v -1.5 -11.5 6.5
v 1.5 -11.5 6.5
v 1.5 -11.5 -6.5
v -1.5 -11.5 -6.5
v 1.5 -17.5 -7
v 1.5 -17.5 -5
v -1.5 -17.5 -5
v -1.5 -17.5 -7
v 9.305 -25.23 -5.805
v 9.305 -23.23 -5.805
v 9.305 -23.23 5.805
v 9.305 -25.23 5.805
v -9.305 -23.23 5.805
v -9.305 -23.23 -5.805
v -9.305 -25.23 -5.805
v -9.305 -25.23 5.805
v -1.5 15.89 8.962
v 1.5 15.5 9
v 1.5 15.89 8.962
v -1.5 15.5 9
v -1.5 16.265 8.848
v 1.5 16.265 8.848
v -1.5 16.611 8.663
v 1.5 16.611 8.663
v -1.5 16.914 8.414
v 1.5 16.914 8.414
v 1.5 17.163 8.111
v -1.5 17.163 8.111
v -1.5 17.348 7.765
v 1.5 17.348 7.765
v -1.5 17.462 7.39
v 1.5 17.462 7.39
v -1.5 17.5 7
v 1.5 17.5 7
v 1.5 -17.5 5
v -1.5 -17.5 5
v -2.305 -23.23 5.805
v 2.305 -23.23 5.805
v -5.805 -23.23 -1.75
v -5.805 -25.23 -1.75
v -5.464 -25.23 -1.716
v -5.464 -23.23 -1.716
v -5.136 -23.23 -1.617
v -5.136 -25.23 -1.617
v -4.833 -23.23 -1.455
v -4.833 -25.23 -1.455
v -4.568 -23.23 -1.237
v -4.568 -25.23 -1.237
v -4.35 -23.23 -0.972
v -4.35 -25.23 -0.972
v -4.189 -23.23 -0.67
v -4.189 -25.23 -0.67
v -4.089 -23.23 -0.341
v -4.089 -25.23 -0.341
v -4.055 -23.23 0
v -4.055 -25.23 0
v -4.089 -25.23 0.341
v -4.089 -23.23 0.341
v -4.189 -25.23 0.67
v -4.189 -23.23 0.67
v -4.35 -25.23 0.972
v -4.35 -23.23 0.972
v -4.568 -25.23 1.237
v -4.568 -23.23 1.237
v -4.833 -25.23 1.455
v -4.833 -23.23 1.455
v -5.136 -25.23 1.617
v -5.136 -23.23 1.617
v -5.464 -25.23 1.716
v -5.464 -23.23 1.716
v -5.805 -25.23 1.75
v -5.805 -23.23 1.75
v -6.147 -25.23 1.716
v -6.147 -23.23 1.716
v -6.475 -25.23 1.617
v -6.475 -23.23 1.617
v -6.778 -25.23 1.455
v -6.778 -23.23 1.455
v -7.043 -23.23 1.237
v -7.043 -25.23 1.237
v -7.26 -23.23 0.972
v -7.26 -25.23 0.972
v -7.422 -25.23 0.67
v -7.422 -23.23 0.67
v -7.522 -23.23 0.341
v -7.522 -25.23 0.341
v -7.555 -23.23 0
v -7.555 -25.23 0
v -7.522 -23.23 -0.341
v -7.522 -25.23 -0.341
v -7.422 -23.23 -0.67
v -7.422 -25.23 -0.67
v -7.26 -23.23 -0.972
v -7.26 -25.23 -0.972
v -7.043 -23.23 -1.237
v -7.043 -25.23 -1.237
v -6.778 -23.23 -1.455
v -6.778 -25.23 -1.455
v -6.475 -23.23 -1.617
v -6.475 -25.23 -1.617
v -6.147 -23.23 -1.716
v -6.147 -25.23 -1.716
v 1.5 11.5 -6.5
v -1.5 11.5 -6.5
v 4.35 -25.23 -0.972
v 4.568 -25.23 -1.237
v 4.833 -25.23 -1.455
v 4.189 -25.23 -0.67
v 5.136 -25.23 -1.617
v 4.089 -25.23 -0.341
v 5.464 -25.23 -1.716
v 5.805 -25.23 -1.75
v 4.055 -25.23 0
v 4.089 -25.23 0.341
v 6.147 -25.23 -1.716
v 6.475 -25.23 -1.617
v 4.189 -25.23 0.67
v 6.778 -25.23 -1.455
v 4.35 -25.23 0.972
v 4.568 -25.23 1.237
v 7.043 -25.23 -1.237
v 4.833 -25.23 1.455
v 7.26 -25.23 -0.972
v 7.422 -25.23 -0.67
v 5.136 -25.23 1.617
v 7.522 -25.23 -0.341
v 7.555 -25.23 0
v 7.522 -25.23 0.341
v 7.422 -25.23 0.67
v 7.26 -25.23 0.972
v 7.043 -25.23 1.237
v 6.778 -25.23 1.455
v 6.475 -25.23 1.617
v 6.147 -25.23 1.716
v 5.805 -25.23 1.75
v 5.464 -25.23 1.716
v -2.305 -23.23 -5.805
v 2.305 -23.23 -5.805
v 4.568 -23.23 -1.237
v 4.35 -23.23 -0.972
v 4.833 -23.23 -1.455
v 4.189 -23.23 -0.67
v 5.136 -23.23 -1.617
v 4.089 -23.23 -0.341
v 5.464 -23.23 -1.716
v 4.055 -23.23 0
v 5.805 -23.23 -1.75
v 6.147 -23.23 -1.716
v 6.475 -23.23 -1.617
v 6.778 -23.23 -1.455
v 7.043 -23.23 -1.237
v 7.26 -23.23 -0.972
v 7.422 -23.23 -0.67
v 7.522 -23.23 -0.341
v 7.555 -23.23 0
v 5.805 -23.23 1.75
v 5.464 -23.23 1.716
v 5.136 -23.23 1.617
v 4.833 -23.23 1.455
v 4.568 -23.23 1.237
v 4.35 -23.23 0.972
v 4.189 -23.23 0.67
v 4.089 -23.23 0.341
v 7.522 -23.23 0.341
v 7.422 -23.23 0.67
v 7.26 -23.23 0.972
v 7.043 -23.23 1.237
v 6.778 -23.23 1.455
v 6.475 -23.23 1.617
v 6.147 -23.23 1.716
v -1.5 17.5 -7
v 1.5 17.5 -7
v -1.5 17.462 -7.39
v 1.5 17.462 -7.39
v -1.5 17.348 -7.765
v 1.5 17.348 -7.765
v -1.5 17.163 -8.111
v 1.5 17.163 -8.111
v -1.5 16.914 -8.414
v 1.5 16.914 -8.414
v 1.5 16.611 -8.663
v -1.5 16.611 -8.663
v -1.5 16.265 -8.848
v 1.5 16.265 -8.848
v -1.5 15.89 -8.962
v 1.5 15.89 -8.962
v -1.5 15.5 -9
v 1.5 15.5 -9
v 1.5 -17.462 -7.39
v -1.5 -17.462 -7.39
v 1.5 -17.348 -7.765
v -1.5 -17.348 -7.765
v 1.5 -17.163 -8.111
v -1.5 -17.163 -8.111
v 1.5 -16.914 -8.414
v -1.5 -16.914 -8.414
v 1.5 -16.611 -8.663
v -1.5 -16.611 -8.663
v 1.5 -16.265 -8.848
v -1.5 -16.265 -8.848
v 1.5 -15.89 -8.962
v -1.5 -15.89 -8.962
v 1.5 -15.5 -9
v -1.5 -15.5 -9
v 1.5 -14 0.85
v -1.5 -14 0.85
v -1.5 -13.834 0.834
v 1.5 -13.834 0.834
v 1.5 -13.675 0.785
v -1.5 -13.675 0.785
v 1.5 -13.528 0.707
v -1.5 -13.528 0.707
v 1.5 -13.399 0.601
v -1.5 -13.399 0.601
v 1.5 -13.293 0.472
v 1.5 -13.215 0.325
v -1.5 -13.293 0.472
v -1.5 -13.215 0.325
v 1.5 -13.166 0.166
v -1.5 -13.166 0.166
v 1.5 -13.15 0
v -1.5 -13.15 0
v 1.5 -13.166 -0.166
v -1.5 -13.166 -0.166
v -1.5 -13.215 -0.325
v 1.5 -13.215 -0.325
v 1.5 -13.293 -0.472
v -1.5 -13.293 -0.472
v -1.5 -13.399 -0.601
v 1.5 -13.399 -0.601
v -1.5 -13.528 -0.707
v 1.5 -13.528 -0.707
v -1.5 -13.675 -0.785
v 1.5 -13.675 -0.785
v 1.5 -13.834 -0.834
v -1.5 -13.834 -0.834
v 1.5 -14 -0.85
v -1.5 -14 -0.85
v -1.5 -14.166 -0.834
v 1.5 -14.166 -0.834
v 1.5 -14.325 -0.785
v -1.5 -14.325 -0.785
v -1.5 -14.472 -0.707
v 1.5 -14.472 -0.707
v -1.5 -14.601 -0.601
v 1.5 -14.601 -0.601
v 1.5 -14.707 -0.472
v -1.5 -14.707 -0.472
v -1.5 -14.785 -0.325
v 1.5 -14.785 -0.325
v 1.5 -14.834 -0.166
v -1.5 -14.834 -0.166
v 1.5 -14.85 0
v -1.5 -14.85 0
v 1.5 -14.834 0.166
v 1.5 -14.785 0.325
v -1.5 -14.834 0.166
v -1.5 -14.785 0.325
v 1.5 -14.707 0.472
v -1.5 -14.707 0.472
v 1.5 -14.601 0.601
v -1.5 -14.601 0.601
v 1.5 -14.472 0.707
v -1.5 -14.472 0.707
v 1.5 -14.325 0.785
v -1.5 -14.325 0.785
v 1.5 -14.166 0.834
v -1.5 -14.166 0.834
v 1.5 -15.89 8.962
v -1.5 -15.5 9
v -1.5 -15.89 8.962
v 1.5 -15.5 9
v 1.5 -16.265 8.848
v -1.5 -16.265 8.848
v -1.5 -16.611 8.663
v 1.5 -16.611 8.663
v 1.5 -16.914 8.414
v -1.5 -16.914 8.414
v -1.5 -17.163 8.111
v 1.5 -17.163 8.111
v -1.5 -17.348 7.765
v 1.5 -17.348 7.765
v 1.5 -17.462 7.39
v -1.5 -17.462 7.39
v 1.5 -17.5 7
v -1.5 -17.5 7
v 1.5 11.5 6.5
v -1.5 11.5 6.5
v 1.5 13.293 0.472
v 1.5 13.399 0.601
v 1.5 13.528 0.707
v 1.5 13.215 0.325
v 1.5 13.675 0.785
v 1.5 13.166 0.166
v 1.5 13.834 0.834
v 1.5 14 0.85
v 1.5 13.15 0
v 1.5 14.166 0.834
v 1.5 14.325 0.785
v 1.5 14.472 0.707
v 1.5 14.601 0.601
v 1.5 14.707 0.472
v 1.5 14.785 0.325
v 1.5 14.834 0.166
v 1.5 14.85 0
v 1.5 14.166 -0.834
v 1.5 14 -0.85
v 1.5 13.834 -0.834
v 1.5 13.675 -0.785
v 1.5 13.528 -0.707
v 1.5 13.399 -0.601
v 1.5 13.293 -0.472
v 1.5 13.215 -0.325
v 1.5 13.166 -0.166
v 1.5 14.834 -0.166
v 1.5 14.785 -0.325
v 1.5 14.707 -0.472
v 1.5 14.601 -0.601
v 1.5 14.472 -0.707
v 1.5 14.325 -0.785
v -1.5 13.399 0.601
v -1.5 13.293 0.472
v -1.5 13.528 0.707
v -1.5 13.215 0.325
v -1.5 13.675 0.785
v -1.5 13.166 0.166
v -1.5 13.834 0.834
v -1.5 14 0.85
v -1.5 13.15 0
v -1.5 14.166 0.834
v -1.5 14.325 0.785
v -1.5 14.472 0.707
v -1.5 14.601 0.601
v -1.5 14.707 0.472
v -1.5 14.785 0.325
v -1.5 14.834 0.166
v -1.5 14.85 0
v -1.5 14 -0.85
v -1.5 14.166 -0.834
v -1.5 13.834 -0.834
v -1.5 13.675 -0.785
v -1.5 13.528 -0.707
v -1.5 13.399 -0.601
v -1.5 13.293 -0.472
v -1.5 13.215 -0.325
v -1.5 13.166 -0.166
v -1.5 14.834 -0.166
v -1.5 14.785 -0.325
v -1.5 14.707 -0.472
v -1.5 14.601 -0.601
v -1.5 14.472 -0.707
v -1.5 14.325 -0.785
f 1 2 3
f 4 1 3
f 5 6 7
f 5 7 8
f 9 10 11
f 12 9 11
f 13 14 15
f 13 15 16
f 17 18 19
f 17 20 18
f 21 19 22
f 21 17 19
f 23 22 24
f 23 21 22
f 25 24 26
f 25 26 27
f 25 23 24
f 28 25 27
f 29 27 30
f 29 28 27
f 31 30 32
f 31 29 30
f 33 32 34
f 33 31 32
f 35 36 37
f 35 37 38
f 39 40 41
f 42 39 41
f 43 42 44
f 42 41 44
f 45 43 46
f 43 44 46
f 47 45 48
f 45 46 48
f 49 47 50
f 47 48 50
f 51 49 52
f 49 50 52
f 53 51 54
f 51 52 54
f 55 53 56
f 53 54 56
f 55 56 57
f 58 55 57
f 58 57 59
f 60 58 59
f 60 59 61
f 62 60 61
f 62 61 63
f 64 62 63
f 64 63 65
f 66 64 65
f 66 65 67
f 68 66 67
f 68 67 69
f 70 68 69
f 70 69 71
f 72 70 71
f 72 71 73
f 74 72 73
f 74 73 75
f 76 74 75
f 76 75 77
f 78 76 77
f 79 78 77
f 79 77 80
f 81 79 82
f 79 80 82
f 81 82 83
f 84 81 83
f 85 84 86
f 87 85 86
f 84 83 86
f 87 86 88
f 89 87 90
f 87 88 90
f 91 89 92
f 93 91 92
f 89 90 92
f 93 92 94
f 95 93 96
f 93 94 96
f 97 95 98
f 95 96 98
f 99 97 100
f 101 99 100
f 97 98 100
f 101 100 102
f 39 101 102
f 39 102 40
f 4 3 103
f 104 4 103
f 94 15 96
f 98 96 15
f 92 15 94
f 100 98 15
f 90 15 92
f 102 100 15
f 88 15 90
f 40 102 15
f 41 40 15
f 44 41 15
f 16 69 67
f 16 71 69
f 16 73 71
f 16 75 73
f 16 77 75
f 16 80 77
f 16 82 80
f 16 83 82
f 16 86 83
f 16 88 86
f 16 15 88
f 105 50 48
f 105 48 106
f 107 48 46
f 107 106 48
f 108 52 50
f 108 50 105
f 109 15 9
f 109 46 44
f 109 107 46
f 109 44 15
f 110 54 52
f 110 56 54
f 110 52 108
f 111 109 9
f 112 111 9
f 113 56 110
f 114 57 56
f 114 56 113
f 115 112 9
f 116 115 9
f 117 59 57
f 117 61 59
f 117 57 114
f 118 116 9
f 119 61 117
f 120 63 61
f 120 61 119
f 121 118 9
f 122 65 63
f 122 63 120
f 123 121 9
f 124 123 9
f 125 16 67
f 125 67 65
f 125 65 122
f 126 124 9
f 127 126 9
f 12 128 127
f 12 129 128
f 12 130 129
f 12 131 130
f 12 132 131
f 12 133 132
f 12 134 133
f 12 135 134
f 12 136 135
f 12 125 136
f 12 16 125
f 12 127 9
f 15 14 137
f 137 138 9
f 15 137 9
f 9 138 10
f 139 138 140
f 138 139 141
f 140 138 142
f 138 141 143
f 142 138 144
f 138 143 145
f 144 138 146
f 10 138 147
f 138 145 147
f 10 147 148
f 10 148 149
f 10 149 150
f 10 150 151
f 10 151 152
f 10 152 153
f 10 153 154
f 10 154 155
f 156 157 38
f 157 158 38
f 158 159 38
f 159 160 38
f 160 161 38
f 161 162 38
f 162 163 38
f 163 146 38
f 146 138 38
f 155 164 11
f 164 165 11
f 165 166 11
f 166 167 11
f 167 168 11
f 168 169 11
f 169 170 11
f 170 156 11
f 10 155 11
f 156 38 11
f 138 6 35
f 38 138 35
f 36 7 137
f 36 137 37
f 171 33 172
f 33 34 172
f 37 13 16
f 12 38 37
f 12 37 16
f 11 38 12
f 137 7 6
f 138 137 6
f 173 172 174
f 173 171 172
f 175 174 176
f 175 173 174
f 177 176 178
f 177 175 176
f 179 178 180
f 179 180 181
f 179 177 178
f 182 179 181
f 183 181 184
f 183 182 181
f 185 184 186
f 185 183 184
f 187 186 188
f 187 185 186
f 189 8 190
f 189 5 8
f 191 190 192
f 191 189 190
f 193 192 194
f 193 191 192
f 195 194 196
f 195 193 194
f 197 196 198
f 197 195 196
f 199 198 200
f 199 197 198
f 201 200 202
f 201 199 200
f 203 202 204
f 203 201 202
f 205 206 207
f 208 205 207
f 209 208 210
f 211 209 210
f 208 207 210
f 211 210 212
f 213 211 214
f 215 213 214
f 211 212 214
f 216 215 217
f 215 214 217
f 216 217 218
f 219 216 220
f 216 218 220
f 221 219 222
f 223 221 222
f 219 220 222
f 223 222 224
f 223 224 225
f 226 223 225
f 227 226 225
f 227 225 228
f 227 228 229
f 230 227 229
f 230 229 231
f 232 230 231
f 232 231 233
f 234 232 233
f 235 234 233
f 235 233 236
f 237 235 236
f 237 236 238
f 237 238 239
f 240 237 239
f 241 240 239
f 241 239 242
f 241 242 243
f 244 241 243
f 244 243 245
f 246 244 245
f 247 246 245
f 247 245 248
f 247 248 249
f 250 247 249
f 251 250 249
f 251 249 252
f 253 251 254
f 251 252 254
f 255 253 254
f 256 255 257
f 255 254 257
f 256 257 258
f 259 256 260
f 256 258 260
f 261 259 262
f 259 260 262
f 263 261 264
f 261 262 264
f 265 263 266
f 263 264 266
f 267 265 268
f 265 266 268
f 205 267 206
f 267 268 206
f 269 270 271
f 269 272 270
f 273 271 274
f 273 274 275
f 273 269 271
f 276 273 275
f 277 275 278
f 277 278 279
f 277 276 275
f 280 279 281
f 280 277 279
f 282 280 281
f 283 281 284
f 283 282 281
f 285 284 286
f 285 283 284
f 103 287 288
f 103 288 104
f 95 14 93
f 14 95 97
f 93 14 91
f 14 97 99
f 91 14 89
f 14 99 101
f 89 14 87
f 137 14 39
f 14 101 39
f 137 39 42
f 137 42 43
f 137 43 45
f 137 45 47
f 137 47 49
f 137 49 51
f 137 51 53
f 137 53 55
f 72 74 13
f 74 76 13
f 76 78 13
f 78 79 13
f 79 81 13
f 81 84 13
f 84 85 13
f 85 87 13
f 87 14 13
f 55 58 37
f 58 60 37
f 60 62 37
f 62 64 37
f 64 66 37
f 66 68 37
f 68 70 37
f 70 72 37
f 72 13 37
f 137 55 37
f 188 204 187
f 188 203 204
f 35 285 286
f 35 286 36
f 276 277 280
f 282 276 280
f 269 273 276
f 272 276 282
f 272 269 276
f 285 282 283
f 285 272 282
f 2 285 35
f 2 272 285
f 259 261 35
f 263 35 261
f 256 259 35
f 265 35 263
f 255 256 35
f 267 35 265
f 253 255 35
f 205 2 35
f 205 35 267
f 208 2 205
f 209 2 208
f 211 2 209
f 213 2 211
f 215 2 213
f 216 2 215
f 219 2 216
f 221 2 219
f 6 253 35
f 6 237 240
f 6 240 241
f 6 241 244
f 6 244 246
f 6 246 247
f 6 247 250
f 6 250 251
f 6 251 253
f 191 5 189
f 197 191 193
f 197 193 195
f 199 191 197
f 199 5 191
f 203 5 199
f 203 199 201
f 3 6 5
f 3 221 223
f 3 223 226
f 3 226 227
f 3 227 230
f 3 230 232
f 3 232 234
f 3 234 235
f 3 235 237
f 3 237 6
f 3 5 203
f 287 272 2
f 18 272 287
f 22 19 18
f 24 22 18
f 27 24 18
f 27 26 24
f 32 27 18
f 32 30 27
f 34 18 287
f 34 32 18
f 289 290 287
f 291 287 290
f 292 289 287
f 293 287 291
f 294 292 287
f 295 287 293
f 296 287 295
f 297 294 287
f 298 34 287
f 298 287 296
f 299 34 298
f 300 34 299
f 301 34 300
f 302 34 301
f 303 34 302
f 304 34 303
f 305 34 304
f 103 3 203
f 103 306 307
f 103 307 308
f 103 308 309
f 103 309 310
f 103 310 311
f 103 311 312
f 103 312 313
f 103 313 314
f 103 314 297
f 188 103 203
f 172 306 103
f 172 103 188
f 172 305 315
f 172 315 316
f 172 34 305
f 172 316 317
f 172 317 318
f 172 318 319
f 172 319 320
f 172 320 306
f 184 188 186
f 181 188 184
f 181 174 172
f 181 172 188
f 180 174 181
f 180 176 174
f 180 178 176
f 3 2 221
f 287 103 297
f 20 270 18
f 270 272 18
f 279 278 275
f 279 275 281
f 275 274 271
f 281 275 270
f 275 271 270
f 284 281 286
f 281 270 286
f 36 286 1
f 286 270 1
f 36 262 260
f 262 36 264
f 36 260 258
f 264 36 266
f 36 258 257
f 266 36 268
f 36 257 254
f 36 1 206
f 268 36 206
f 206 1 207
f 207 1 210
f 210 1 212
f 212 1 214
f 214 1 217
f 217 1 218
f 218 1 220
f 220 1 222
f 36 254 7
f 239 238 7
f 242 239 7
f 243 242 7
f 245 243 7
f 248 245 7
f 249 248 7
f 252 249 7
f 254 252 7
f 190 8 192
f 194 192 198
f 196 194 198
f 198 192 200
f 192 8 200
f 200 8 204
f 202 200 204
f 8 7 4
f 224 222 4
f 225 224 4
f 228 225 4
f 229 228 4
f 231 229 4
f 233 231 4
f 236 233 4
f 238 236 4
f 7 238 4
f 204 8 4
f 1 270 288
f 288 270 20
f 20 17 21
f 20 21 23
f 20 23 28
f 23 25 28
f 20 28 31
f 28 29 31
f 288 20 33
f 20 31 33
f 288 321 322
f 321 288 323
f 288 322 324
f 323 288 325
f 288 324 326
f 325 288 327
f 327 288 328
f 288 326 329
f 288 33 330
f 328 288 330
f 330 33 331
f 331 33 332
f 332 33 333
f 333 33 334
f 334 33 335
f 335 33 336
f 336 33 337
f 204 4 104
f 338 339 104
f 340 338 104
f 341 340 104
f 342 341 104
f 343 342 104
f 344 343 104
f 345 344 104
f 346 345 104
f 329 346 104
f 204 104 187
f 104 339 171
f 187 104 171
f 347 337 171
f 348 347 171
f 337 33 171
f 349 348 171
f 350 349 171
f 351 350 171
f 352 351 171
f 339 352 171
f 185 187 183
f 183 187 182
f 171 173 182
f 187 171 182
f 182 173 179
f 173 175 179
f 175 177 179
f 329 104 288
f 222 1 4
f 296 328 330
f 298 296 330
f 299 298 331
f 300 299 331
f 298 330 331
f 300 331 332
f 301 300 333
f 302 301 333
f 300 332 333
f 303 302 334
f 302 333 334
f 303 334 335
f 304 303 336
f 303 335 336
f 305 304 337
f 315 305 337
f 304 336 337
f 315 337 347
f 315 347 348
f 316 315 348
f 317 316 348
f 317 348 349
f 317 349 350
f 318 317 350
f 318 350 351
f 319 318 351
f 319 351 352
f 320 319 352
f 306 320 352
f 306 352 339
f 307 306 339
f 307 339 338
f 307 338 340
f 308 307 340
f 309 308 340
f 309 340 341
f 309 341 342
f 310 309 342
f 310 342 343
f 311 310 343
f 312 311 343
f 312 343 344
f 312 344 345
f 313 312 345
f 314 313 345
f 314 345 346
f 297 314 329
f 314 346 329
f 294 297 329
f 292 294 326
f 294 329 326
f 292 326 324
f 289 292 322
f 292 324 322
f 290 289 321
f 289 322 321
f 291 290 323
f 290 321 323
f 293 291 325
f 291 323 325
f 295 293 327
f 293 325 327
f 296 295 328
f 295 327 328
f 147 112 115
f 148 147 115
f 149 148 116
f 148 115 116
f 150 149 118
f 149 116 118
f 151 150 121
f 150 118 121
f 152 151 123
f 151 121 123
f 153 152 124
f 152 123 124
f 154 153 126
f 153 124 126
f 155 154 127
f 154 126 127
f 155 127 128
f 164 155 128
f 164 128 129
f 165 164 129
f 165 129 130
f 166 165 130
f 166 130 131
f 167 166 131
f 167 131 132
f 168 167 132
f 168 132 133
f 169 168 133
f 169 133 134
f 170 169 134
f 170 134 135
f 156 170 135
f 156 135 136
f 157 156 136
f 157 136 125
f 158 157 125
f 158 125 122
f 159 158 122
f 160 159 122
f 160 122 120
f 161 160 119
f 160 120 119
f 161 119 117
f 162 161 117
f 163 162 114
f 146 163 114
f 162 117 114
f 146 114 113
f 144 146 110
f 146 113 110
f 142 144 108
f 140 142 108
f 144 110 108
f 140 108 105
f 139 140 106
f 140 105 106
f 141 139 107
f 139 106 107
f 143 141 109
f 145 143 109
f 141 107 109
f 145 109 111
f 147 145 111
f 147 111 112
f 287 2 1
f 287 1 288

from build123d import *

# Parameters (mm, degrees)
ESBO_O1_W                = 18
ESBO_O1_H                = 35
RESSALTO_EXTRUS_O1_DEPTH = 1.5
CORTE_EXTRUS_O1_REACH    = 21.906
ESBO_O2_W                = 13
ESBO_O2_H                = 23
CORTE_EXTRUS_O2_REACH    = 21.906
ESBO_O3_R                = 0.85
FILETE1_R                = 2
ESBO_O4_W                = 3
ESBO_O4_H                = 10
RESSALTO_EXTRUS_O2_DEPTH = 5.73
RESSALTO_EXTRUS_O2_DRAFT = -8
ESBO_O5_W                = 18.610597966
ESBO_O5_H                = 11.610597966
RESSALTO_EXTRUS_O3_DEPTH = 2
CORTE_EXTRUS_O4_REACH    = 46.648
ESBO_O7_R                = 1.75


with BuildPart() as part:
    # Esboço1 → Ressalto-extrusão1 (new, symmetric)
    with BuildSketch(Plane(origin=(0, 0, 0), x_dir=(0, 0, -1), z_dir=(1, 0, 0))):
        Rectangle(ESBO_O1_W, ESBO_O1_H)
    extrude(amount=RESSALTO_EXTRUS_O1_DEPTH, both=True)

    # Esboço2 → Corte-extrusão1 (cut, up to next)
    with BuildSketch(Plane(origin=(1.5, 0, 0), x_dir=(0, 0, -1), z_dir=(1, 0, 0)), mode=Mode.PRIVATE) as corte_extrus_o1_sk1:
        Rectangle(ESBO_O2_W, ESBO_O2_H)
    corte_extrus_o1_tool1 = extrude(corte_extrus_o1_sk1.sketch, amount=-CORTE_EXTRUS_O1_REACH, mode=Mode.PRIVATE) & part.part
    add(corte_extrus_o1_tool1.solids().sort_by_distance((1.5, 0, 0))[0], mode=Mode.SUBTRACT)

    # Esboço3 → Corte-extrusão2 (cut, up to next)
    with BuildSketch(Plane.ZY.offset(1.5), mode=Mode.PRIVATE) as corte_extrus_o2_sk1:
        with Locations((0, 14)):
            Circle(ESBO_O3_R)
    corte_extrus_o2_tool1 = extrude(corte_extrus_o2_sk1.sketch, amount=-CORTE_EXTRUS_O2_REACH, mode=Mode.PRIVATE) & part.part
    # Esboço3 → Corte-extrusão2 (cut, up to next)
    with BuildSketch(Plane.ZY.offset(1.5), mode=Mode.PRIVATE) as corte_extrus_o2_sk2:
        with Locations((0, -14)):
            Circle(ESBO_O3_R)
    corte_extrus_o2_tool2 = extrude(corte_extrus_o2_sk2.sketch, amount=-CORTE_EXTRUS_O2_REACH, mode=Mode.PRIVATE) & part.part
    add(corte_extrus_o2_tool1.solids().sort_by_distance((-1.5, 14, 0))[0], mode=Mode.SUBTRACT)
    add(corte_extrus_o2_tool2.solids().sort_by_distance((-1.5, -14, 0))[0], mode=Mode.SUBTRACT)

    # Filete1
    filete1_edges = [part.edges().sort_by_distance(p)[0] for p in [
        (0, -17.5, -9),
        (0, -17.5, 9),
        (0, 17.5, 9),
        (0, 17.5, -9),
    ]]
    fillet(filete1_edges, radius=FILETE1_R)


with BuildPart() as ressalto_extrus_o2_tool:
    # Esboço4 → Ressalto-extrusão2 (with draft: the straight prism first)
    with BuildSketch(Plane.XZ.offset(17.5)):
        Rectangle(ESBO_O4_W, ESBO_O4_H)
    extrude(amount=RESSALTO_EXTRUS_O2_DEPTH)
    # Ressalto-extrusão2: the draft: its side faces are tilted about the plane it starts from
    ressalto_extrus_o2_sides = [ressalto_extrus_o2_tool.faces().sort_by_distance(p)[0] for p in [
        (0, -20.365, -5),
        (1.5, -20.365, 0),
        (0, -20.365, 5),
        (-1.5, -20.365, 0),
    ]]
    draft(ressalto_extrus_o2_sides, Plane.XZ.offset(17.5), RESSALTO_EXTRUS_O2_DRAFT)


with BuildPart() as part_1:
    add(part.part)

    # Ressalto-extrusão2: add ressalto_extrus_o2_tool
    add(ressalto_extrus_o2_tool.part)

    # Esboço5 → Ressalto-extrusão3 (add)
    with BuildSketch(Plane.XZ.offset(23.23)):
        Rectangle(ESBO_O5_W, ESBO_O5_H)
    extrude(amount=RESSALTO_EXTRUS_O3_DEPTH)

    # Esboço7 → Corte-extrusão4 (cut, up to next)
    with BuildSketch(Plane.XZ.offset(25.23), mode=Mode.PRIVATE) as corte_extrus_o4_sk1:
        with Locations(Location((-5.805298983, 0, 0), (0, 0, 270))):
            Circle(ESBO_O7_R)
    corte_extrus_o4_tool1 = extrude(corte_extrus_o4_sk1.sketch, amount=-CORTE_EXTRUS_O4_REACH, mode=Mode.PRIVATE) & part_1.part
    # Esboço7 → Corte-extrusão4 (cut, up to next)
    with BuildSketch(Plane.XZ.offset(25.23), mode=Mode.PRIVATE) as corte_extrus_o4_sk2:
        with Locations(Location((5.805298983, 0, 0), (0, 0, 270))):
            Circle(ESBO_O7_R)
    corte_extrus_o4_tool2 = extrude(corte_extrus_o4_sk2.sketch, amount=-CORTE_EXTRUS_O4_REACH, mode=Mode.PRIVATE) & part_1.part
    add(corte_extrus_o4_tool1.solids().sort_by_distance((-5.805299, -25.23, 0))[0], mode=Mode.SUBTRACT)
    add(corte_extrus_o4_tool2.solids().sort_by_distance((5.805299, -25.23, 0))[0], mode=Mode.SUBTRACT)


solid = part_1.part
